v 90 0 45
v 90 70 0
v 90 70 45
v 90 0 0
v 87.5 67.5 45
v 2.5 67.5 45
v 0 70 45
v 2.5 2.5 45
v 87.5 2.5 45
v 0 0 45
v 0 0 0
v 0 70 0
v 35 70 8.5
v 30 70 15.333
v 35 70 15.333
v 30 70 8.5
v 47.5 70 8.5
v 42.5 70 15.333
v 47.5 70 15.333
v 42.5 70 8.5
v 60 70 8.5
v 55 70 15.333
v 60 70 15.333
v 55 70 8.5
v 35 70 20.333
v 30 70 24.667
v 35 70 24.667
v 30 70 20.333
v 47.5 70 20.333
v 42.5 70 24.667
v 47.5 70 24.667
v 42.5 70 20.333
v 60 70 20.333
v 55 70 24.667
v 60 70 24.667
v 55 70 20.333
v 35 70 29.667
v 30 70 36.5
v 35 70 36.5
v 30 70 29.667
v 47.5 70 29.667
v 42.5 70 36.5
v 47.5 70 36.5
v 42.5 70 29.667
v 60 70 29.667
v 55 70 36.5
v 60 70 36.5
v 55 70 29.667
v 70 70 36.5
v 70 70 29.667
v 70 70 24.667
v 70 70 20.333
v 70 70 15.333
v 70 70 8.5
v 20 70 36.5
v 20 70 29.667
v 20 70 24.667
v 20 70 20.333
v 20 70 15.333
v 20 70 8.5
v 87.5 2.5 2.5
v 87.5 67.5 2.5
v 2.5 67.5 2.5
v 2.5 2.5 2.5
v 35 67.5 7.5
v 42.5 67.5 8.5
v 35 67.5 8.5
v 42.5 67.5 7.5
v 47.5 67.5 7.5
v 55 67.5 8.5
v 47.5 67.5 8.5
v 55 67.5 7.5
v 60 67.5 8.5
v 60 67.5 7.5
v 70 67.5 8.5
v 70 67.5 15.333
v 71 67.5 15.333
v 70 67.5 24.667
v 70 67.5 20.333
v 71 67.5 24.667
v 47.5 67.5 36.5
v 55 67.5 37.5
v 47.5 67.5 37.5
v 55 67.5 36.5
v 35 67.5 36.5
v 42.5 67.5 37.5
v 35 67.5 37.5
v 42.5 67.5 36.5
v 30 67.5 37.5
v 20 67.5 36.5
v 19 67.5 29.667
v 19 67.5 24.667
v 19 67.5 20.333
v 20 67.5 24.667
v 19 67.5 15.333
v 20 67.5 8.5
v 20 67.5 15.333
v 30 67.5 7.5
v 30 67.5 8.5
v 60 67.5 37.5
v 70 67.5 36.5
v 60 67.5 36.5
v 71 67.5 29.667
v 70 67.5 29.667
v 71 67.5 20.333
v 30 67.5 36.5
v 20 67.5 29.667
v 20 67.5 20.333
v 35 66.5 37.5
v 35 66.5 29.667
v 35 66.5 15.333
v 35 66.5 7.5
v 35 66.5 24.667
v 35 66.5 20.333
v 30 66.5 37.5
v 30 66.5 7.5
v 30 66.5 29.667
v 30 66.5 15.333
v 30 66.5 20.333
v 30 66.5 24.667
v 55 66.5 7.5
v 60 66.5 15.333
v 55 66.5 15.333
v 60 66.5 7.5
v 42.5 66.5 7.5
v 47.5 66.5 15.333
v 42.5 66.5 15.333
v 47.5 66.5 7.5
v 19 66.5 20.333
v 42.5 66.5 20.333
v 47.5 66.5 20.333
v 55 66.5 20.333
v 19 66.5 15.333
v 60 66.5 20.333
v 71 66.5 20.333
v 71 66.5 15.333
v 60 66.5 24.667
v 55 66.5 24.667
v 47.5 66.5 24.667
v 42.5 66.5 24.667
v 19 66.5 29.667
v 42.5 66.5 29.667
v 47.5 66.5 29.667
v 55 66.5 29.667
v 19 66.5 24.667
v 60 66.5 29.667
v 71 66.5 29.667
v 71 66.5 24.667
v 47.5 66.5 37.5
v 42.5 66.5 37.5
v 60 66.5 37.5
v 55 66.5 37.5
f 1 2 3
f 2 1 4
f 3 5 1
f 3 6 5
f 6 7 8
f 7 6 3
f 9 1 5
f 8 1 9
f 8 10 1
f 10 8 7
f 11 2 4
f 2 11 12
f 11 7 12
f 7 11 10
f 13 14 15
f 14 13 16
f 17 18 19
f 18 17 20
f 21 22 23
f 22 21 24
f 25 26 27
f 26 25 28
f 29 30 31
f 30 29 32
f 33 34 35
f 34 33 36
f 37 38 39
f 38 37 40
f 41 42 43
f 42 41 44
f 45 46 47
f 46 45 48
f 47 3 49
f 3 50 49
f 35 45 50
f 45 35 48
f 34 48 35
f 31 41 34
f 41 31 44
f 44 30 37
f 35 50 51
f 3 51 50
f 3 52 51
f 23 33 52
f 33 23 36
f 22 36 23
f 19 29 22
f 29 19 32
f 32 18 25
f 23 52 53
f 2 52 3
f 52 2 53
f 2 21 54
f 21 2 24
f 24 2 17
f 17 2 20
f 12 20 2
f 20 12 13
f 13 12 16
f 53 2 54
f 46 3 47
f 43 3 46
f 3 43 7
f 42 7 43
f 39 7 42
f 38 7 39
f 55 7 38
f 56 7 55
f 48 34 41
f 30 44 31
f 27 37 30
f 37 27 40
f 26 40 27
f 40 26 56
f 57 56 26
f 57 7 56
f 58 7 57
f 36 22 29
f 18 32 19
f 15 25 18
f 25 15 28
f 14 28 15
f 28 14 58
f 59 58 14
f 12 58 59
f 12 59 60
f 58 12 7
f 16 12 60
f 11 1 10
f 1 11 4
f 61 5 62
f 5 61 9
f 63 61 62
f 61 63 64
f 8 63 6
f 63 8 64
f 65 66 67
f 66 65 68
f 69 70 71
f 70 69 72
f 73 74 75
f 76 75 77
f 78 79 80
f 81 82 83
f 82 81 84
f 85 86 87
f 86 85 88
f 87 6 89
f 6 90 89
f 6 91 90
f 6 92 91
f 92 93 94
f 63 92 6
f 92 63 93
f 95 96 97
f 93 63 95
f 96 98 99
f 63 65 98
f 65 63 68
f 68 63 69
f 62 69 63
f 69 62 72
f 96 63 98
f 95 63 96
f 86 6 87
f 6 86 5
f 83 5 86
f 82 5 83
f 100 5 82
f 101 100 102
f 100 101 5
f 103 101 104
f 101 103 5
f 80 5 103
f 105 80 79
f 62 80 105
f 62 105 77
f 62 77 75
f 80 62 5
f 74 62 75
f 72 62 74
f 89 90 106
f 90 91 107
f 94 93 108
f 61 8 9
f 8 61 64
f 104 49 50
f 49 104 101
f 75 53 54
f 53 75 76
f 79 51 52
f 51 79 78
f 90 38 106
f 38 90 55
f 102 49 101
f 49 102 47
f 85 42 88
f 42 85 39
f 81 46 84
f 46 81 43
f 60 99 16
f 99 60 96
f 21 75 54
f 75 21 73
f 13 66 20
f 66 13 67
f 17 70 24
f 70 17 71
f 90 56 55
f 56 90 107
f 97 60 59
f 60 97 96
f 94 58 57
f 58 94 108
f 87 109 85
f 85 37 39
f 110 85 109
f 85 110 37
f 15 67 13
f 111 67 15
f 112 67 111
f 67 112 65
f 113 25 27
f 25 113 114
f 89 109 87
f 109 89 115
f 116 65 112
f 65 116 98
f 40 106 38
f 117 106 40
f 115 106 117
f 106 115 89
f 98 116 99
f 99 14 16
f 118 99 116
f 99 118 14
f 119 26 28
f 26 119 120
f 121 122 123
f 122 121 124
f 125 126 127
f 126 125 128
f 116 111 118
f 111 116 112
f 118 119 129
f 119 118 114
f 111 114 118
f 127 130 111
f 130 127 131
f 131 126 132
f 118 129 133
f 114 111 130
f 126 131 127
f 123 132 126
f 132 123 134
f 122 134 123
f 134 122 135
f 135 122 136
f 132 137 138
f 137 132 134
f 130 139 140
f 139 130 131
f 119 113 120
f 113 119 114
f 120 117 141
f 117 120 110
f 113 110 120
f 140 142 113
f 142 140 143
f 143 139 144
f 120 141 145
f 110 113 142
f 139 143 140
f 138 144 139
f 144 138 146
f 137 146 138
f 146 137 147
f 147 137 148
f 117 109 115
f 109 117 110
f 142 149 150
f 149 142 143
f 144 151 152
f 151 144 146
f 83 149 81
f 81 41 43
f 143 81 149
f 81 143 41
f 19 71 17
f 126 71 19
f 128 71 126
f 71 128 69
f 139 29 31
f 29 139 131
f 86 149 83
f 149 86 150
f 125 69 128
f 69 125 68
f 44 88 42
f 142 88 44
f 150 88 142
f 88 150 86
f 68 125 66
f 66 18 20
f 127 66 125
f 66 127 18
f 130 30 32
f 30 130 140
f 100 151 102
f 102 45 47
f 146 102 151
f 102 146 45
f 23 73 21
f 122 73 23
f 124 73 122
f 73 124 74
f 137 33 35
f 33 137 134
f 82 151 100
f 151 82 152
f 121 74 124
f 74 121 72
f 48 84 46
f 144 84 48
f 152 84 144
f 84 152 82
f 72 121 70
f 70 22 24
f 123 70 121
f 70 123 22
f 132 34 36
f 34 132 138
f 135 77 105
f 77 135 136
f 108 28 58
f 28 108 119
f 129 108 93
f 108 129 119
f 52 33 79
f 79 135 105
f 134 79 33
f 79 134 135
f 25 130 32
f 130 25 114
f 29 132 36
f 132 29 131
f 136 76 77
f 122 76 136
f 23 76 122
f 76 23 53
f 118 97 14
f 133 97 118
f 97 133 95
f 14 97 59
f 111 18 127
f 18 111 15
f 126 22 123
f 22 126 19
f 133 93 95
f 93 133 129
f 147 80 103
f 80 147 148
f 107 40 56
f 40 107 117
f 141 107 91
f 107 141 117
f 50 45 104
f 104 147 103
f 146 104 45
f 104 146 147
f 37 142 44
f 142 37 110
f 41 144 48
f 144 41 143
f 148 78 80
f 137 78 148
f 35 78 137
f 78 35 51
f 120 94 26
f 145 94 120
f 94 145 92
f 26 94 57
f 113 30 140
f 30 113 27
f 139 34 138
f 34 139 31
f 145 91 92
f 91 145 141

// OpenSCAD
$fn = 32;

// ----------------------------------------------------------------------
// Vent box: crossgrid enclosure
// ----------------------------------------------------------------------

// --- parameters (mm) ---
box_l = 90;               // box length, X
box_w = 70;               // box width, Y
box_h = 45;               // box height, Z
wall_t = 2.5;             // shell wall thickness
win_l = 50;               // vent window width, X
win_h = 28;               // vent window height, Z
bar_w = 5;                // grid bar width
n_v = 3;                  // vertical bar count
n_h = 2;                  // horizontal bar count

win_z0 = (box_h - win_h) / 2;  // window lower edge Z
v_step = win_l / (n_v + 1);  // vertical bar step
h_step = win_h / (n_h + 1);  // horizontal bar step

difference() {
  union() {
    difference() {
      cube([box_l, box_w, box_h]);
  translate([wall_t, wall_t, wall_t])
    cube([box_l - 2 * wall_t, box_w - 2 * wall_t, box_h]);
  translate([(box_l - win_l) / 2, box_w - wall_t - 1, win_z0])
    cube([win_l, wall_t + 2, win_h]);
    }
    for (i = [1 : n_v])
      translate([(box_l - win_l) / 2 + i * v_step - bar_w / 2,
                 box_w - wall_t - 1, win_z0 - 1])
        cube([bar_w, wall_t + 1, win_h + 2]);
    for (i = [1 : n_h])
      translate([(box_l - win_l) / 2 - 1, box_w - wall_t - 1,
                 win_z0 + i * h_step - bar_w / 2])
        cube([win_l + 2, wall_t + 1, bar_w]);
  }
}
